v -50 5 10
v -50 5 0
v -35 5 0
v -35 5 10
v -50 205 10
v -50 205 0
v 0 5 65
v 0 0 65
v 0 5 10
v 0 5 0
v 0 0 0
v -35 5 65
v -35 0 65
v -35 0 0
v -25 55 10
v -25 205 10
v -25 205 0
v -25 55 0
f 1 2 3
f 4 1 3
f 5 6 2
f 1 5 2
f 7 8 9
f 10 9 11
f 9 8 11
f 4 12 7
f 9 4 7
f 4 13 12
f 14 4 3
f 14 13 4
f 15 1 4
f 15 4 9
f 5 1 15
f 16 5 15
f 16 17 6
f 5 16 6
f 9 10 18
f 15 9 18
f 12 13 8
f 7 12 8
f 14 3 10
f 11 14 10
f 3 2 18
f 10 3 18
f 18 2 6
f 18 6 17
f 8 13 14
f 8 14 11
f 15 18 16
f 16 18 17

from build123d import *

# Parameters (mm, degrees)
SKETCH1_W           = 35
SKETCH1_H           = 65
BOSS_EXTRUDE1_DEPTH = 5
BOSS_EXTRUDE2_DEPTH = 10


with BuildPart() as part:
    # Sketch1 → Boss-Extrude1 (new body)
    with BuildSketch(Plane(origin=(0, 0, 0), x_dir=(1, 0, 0), z_dir=(0, 1, 0))):
        with Locations((-17.5, -32.5)):
            Rectangle(SKETCH1_W, SKETCH1_H)
    extrude(amount=BOSS_EXTRUDE1_DEPTH)

    # Sketch2 → Boss-Extrude2 (add)
    with BuildSketch(Plane.XY):
        Polygon((0, 5), (-25, 55), (-25, 205), (-50, 205), (-50, 5), align=None)
    extrude(amount=BOSS_EXTRUDE2_DEPTH)


solid = part.part
